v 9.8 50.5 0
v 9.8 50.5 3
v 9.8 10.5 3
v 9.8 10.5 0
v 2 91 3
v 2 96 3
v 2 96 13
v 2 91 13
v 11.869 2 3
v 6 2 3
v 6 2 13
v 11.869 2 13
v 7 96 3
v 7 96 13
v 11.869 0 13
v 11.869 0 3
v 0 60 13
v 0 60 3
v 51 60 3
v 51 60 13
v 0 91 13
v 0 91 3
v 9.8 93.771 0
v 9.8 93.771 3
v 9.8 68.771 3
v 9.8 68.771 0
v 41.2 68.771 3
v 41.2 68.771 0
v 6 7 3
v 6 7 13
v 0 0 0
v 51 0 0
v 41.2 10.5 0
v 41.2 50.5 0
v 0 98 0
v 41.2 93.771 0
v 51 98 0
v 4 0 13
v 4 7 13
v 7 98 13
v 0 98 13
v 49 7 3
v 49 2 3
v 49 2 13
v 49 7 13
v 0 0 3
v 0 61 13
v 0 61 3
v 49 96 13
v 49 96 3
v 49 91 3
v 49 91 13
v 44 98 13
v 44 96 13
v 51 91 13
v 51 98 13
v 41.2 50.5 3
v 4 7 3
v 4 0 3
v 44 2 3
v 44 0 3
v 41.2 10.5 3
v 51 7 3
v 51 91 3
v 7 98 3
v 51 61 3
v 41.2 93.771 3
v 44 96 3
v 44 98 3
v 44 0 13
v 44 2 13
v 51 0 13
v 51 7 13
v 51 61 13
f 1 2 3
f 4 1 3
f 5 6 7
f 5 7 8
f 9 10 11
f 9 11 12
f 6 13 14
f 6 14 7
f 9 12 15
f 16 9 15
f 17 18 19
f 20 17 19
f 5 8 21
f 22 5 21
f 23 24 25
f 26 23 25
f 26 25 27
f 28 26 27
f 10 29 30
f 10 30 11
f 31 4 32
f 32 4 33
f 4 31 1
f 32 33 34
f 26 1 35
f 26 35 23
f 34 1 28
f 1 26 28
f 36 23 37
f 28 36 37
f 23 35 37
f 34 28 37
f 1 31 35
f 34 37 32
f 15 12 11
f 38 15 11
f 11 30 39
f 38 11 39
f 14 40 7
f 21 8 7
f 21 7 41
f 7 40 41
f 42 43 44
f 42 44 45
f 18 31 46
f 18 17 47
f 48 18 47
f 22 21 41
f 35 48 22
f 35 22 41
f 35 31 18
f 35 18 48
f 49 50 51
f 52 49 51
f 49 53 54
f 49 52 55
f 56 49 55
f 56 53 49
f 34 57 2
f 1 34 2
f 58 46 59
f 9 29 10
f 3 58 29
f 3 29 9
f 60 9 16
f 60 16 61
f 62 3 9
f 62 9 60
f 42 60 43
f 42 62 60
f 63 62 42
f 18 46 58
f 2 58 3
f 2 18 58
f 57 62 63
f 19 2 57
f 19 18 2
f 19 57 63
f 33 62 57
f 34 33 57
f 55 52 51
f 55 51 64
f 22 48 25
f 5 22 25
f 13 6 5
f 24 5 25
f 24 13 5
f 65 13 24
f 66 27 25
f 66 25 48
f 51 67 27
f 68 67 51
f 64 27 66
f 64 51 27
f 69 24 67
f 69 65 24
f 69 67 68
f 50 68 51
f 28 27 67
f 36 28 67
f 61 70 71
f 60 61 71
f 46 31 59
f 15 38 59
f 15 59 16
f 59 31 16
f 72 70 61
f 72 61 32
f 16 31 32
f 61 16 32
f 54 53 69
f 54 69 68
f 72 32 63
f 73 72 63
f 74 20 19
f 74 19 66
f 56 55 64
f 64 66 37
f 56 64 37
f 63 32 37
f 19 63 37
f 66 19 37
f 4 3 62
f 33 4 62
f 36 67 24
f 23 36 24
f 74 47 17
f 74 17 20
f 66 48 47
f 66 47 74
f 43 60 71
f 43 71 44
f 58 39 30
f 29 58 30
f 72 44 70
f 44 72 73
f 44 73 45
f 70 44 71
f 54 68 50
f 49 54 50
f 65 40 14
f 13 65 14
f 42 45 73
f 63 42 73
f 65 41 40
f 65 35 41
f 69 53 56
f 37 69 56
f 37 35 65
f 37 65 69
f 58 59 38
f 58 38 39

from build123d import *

# Parameters (mm, degrees)
SKETCH1_W           = 51
SKETCH1_H           = 98
BOSS_EXTRUDE2_DEPTH = 3
BOSS_EXTRUDE3_DEPTH = 10
BOSS_EXTRUDE4_DEPTH = 10
SKETCH5_W           = 51
SKETCH5_H           = 1
BOSS_EXTRUDE5_DEPTH = 10
CUT_EXTRUDE1_DEPTH  = 10


with BuildPart() as part:
    # Sketch1 → Boss-Extrude2 (new body)
    with BuildSketch(Plane.XY):
        with Locations((25.5, 49)):
            Rectangle(SKETCH1_W, SKETCH1_H)
    extrude(amount=BOSS_EXTRUDE2_DEPTH)

    # Sketch3 → Boss-Extrude3 (add)
    with BuildSketch(Plane.XY.offset(3)):
        Polygon((0, 98), (7, 98), (7, 96), (2, 96), (2, 91), (0, 91), align=None)
        Polygon((51, 98), (44, 98), (44, 96), (49, 96), (49, 91), (51, 91), align=None)
        Polygon((51, 0), (44, 0), (44, 2), (49, 2), (49, 7), (51, 7), align=None)
    extrude(amount=BOSS_EXTRUDE3_DEPTH)

    # Sketch4 → Boss-Extrude4 (add)
    with BuildSketch(Plane.XY.offset(3)):
        Polygon((4, 0), (4, 7), (6, 7), (6, 2), (11.869482621, 2), (11.869482621, 0), align=None)
    extrude(amount=BOSS_EXTRUDE4_DEPTH)

    # Sketch5 → Boss-Extrude5 (add)
    with BuildSketch(Plane.XY.offset(3)):
        with Locations((25.5, 60.5)):
            Rectangle(SKETCH5_W, SKETCH5_H)
    extrude(amount=BOSS_EXTRUDE5_DEPTH)

    # Sketch6 → Cut-Extrude1 (cut)
    with BuildSketch(Plane.XY.offset(3)):
        Polygon((39.8, 93.770532131), (9.8, 93.770532131), (9.8, 68.770532131), (41.2, 68.770532131), (41.2, 93.770532131), align=None)
        Polygon((39.8, 50.5), (9.8, 50.5), (9.8, 10.5), (41.2, 10.5), (41.2, 50.5), align=None)
    extrude(amount=-CUT_EXTRUDE1_DEPTH, mode=Mode.SUBTRACT)


solid = part.part
